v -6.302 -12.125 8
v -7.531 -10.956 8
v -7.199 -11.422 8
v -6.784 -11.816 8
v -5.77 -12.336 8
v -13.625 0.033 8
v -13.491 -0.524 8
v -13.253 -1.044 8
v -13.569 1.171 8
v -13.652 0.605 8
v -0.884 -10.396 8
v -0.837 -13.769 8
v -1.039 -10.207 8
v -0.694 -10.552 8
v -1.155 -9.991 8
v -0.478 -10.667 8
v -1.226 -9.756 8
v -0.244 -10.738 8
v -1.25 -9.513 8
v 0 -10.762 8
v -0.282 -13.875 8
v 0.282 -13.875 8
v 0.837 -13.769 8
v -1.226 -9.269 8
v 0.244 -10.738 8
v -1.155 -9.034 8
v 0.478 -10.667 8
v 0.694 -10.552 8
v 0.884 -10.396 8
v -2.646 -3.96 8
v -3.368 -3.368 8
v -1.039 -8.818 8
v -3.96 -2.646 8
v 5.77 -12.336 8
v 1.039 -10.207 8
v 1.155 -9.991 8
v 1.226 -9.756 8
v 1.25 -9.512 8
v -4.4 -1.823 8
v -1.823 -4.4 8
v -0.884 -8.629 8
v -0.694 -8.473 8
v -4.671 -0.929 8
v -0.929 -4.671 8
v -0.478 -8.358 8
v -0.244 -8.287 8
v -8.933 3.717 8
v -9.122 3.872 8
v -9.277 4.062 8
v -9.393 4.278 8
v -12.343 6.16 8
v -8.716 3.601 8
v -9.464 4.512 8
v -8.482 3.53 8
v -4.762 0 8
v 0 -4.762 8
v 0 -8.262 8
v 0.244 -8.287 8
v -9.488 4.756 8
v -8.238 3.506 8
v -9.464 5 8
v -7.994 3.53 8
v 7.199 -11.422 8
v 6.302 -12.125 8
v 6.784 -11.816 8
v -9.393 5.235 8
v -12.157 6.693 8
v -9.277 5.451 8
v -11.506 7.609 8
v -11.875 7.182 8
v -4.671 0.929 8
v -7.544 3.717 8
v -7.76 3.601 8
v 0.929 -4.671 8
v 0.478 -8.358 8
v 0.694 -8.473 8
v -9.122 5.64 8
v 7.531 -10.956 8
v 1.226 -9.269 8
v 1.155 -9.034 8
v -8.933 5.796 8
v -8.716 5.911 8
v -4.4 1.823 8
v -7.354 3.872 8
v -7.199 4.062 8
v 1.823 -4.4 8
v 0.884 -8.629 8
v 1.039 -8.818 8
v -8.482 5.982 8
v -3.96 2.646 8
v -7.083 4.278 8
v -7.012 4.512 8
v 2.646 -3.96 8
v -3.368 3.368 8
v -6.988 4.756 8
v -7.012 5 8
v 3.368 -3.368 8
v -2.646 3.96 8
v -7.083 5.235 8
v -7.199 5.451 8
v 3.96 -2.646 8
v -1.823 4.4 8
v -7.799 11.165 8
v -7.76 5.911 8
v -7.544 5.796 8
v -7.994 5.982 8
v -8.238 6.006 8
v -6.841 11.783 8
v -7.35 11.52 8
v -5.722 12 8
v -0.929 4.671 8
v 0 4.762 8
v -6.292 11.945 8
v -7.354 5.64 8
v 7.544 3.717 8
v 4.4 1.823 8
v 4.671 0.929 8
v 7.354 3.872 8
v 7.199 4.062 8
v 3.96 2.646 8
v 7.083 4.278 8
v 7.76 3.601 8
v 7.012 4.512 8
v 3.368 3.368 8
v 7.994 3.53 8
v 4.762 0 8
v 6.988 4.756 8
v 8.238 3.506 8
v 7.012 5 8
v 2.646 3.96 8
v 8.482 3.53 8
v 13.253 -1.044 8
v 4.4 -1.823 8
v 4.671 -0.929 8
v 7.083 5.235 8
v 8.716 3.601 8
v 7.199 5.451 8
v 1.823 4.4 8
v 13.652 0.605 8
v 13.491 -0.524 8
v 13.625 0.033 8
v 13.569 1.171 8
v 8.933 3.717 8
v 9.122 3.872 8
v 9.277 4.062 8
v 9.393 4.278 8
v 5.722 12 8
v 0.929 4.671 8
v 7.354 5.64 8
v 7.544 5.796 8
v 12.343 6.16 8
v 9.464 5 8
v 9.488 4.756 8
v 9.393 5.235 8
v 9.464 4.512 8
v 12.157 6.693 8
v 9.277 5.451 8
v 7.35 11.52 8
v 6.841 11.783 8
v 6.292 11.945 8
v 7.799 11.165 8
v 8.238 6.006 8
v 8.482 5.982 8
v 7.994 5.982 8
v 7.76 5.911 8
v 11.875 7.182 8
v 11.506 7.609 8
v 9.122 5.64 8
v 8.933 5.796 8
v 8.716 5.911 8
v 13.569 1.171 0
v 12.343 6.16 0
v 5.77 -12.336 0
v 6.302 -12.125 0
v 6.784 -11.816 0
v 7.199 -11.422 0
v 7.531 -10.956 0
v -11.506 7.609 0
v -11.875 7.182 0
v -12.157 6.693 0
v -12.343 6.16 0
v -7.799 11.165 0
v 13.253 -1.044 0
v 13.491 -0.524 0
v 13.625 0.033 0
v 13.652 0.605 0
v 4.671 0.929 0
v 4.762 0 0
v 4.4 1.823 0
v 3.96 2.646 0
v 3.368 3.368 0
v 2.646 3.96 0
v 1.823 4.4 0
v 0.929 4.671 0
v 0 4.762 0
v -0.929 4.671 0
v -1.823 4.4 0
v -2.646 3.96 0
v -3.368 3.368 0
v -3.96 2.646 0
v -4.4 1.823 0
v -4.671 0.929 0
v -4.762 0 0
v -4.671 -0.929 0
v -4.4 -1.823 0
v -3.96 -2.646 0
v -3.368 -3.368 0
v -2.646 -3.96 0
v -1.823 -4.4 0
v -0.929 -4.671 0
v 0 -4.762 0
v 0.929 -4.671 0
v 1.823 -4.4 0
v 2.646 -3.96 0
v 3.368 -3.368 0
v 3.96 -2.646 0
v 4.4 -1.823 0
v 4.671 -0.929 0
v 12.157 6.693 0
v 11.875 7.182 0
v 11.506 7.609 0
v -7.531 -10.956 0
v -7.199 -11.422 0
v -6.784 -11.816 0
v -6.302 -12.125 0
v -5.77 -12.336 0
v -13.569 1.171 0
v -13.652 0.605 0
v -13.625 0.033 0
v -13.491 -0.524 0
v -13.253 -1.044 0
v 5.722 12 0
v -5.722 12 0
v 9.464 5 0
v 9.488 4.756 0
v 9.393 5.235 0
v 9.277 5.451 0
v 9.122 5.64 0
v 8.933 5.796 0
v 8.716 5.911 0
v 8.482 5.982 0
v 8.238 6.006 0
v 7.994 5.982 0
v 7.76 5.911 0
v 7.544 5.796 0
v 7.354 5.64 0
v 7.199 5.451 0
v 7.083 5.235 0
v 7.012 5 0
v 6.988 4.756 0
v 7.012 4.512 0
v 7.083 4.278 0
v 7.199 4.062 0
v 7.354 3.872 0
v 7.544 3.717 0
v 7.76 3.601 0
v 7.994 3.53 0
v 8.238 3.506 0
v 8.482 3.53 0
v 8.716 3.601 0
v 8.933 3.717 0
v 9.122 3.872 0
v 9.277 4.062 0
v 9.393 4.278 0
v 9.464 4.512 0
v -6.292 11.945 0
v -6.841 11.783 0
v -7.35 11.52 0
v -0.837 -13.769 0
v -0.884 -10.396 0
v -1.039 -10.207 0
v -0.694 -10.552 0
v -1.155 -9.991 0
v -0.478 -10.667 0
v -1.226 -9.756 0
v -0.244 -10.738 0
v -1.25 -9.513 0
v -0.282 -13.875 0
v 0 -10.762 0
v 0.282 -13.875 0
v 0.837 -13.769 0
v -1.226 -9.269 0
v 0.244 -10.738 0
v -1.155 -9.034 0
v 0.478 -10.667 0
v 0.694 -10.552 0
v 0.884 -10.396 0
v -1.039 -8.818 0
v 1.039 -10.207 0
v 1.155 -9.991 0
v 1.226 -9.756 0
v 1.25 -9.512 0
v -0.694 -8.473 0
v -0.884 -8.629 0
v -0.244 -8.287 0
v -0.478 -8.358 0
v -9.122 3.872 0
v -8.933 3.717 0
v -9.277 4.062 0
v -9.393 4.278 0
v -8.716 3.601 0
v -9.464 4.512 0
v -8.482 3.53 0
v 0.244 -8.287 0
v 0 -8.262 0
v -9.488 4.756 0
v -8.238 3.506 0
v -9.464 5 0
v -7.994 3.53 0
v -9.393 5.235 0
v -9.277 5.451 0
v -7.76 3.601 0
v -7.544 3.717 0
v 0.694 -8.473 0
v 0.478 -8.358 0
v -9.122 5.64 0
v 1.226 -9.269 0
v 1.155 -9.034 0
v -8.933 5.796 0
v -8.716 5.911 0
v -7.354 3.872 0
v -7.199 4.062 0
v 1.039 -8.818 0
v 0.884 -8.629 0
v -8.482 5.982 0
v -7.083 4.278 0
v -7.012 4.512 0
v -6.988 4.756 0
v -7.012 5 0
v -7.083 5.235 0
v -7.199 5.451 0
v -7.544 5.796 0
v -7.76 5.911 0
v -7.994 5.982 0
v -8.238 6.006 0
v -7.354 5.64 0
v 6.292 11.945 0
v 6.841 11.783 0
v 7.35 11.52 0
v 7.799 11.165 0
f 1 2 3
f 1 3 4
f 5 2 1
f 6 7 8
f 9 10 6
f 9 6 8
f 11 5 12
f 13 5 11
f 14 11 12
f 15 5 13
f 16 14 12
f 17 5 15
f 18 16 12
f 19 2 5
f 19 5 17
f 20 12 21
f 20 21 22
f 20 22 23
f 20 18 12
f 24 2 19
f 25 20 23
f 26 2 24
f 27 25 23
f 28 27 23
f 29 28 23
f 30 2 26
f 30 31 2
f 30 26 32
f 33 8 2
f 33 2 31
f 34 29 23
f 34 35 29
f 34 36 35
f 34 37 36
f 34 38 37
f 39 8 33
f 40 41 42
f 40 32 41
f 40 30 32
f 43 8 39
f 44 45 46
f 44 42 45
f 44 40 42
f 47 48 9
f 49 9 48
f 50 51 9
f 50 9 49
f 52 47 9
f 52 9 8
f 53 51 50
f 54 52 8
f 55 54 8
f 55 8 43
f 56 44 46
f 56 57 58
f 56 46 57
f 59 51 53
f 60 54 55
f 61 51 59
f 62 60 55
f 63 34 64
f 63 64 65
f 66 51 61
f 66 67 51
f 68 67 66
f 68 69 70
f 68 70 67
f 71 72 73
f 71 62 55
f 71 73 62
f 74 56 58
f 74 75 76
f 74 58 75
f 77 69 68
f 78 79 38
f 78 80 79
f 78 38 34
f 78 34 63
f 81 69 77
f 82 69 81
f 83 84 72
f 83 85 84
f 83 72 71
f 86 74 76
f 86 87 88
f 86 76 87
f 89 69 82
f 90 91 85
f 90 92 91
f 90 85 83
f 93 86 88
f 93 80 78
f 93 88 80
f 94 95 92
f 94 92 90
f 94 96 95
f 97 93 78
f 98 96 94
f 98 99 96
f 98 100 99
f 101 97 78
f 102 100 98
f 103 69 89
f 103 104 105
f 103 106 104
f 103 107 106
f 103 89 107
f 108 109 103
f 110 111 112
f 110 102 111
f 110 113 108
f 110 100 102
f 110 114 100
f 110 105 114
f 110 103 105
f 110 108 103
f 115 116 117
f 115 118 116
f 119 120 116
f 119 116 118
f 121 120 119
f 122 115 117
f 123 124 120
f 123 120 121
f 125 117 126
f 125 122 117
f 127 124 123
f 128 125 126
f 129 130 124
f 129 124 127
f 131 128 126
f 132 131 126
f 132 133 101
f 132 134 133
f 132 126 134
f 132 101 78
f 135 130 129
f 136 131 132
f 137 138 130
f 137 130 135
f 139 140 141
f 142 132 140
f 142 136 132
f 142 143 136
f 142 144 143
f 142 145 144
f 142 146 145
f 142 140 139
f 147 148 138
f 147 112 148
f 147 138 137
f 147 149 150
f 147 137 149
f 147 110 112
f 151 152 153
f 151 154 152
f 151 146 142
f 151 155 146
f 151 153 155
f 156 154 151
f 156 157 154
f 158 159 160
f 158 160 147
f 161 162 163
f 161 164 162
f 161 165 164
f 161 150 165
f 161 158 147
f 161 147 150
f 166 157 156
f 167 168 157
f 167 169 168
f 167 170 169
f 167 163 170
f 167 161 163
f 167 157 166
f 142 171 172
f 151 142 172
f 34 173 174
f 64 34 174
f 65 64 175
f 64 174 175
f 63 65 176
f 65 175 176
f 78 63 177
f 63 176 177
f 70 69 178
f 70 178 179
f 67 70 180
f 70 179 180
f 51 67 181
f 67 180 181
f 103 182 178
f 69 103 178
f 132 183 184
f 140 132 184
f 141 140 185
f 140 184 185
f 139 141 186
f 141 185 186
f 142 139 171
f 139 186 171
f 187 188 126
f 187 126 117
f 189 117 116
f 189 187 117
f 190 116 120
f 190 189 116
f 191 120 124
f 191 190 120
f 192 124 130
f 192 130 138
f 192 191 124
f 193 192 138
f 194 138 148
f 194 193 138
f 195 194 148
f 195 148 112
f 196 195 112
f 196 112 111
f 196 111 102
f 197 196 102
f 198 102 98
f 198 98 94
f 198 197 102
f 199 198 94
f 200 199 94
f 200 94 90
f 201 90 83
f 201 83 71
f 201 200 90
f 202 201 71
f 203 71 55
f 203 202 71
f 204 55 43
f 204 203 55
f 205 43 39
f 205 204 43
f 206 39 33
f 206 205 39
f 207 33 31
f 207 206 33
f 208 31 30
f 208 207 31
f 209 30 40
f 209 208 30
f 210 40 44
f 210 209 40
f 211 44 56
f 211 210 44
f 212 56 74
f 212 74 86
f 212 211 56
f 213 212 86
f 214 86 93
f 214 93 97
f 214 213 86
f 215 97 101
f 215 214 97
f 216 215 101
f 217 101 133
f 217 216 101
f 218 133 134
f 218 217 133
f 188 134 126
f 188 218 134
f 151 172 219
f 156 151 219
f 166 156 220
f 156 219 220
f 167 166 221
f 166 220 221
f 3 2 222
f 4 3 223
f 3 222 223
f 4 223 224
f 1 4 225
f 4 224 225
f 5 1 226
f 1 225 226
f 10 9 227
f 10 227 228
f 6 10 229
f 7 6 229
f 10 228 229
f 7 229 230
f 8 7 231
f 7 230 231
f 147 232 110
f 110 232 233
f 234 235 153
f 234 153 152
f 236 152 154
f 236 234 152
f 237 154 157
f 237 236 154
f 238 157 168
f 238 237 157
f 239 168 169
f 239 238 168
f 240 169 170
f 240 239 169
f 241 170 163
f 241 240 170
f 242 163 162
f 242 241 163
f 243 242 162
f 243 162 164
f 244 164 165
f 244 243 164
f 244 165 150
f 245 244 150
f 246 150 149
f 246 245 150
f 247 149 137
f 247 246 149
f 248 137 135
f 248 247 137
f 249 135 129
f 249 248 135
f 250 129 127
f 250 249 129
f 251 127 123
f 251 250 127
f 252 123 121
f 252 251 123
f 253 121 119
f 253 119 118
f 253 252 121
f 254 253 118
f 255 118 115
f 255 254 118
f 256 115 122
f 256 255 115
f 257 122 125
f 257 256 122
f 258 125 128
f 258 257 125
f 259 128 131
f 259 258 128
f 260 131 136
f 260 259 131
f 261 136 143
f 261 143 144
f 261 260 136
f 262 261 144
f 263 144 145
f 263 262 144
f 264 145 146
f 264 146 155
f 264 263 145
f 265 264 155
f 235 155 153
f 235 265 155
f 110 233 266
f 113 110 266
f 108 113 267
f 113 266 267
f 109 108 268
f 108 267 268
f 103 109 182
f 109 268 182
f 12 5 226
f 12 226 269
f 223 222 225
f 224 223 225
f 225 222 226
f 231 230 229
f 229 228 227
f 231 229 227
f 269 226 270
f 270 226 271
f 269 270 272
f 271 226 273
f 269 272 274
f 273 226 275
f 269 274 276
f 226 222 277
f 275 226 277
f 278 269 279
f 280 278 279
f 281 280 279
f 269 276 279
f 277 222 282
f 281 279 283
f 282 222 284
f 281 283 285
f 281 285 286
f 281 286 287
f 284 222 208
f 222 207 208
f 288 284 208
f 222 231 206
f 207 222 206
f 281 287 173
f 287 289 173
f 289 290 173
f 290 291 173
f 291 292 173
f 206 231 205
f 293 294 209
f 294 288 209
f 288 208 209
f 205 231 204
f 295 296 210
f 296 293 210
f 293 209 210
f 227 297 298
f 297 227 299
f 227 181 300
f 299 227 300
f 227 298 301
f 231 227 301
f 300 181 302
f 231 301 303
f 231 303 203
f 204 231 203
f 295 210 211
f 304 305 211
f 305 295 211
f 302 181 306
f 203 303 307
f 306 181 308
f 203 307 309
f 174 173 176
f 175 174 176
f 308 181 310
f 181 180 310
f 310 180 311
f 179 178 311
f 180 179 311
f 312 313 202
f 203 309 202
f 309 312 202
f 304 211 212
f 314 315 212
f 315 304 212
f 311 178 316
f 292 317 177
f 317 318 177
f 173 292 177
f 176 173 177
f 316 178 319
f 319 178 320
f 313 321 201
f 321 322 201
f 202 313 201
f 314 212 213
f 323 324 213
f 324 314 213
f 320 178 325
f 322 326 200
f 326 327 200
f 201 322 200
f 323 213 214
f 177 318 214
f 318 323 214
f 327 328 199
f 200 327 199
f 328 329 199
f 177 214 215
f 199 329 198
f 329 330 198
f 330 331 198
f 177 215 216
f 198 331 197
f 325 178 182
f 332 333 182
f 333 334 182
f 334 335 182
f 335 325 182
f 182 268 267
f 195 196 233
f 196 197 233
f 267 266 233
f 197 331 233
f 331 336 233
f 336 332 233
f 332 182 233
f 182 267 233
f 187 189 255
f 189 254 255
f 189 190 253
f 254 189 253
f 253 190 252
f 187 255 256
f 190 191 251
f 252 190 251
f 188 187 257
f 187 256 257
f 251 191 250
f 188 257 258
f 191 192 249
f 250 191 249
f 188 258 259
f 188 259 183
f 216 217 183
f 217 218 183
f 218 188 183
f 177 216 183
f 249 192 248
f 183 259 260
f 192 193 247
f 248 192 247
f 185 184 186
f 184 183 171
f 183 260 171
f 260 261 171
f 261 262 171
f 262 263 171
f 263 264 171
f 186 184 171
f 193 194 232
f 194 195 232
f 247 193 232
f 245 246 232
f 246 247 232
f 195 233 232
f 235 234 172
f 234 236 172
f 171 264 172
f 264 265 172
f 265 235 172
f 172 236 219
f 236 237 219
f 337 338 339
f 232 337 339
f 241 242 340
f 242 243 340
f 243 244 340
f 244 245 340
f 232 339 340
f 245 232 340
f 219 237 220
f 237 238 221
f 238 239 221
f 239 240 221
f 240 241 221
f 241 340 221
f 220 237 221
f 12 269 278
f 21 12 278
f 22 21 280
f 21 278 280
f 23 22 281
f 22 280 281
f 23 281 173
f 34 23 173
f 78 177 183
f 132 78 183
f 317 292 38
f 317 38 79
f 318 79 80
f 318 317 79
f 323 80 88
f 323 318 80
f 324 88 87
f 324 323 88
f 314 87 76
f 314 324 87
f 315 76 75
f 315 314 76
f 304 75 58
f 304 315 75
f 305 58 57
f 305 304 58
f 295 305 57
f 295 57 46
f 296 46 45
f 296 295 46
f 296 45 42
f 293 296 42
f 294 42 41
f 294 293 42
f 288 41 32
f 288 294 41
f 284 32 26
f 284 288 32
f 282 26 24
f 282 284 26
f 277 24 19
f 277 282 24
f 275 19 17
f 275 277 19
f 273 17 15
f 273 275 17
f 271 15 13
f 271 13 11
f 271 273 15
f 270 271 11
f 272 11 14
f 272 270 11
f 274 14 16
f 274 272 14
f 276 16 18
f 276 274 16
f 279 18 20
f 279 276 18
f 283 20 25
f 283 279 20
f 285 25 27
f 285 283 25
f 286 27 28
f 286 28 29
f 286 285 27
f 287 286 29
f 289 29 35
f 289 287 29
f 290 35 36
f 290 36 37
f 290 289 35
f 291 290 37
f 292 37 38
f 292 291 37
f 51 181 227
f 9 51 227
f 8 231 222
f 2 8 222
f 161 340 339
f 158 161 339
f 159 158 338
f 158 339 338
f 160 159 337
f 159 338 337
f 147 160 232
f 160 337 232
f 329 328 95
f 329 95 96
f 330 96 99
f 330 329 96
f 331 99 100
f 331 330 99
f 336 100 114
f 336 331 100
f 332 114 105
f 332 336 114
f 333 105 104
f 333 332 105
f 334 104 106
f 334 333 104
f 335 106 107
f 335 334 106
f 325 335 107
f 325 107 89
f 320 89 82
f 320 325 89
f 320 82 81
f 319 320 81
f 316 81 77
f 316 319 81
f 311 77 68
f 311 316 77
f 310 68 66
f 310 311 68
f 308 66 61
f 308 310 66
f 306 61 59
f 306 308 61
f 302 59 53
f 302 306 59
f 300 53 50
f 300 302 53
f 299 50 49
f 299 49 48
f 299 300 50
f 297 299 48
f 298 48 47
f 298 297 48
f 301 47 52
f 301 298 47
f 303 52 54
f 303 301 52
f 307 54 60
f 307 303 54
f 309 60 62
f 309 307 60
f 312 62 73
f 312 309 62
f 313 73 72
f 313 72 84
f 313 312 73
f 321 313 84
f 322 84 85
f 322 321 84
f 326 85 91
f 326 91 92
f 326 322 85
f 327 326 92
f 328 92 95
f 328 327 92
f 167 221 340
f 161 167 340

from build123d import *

# Parameters (mm, degrees)
SKETCH1_R           = 4.7625
SKETCH1_R_2         = 1.25
BOSS_EXTRUDE1_DEPTH = 8


with BuildPart() as part:
    # Sketch1 → Boss-Extrude1 (new body)
    with BuildSketch(Plane.XY):
        with BuildLine():
            Line((-13.253372163, -1.044486042), (-7.531237528, -10.955513958))
            ThreePointArc((-7.531237528, -10.955513958), (-6.784217233, -11.816359568), (-5.770008435, -12.336431676))
            Line((-5.770008435, -12.336431676), (-0.836847118, -13.76941319))
            ThreePointArc((-0.836847118, -13.76941319), (0, -13.888495471), (0.836847118, -13.76941319))
            Line((0.836847118, -13.76941319), (5.770008435, -12.336431676))
            ThreePointArc((5.770008435, -12.336431676), (6.784217233, -11.816359568), (7.531237528, -10.955513958))
            Line((7.531237528, -10.955513958), (13.253372163, -1.044486042))
            ThreePointArc((13.253372163, -1.044486042), (13.625376182, 0.032875315), (13.568667441, 1.171241953))
            Line((13.568667441, 1.171241953), (12.343085176, 6.159975731))
            ThreePointArc((12.343085176, 6.159975731), (12.027789898, 6.944247736), (11.506238058, 7.609437458))
            Line((11.506238058, 7.609437458), (7.798659006, 11.165189723))
            ThreePointArc((7.798659006, 11.165189723), (6.841158949, 11.783484253), (5.722134635, 12))
            Line((5.722134635, 12), (-5.722134635, 12))
            ThreePointArc((-5.722134635, 12), (-6.841158949, 11.783484253), (-7.798659006, 11.165189723))
            Line((-7.798659006, 11.165189723), (-11.506238058, 7.609437458))
            ThreePointArc((-11.506238058, 7.609437458), (-12.027789898, 6.944247736), (-12.343085176, 6.159975731))
            Line((-12.343085176, 6.159975731), (-13.568667441, 1.171241953))
            ThreePointArc((-13.568667441, 1.171241953), (-13.625376182, 0.032875315), (-13.253372163, -1.044486042))
        make_face()
        Circle(SKETCH1_R, mode=Mode.SUBTRACT)
        with Locations((-8.238066653, 4.75625)):
            Circle(SKETCH1_R_2, mode=Mode.SUBTRACT)
        with Locations((8.238066653, 4.75625)):
            Circle(SKETCH1_R_2, mode=Mode.SUBTRACT)
        with Locations((0, -9.5125)):
            Circle(SKETCH1_R_2, mode=Mode.SUBTRACT)
    extrude(amount=BOSS_EXTRUDE1_DEPTH)


solid = part.part
